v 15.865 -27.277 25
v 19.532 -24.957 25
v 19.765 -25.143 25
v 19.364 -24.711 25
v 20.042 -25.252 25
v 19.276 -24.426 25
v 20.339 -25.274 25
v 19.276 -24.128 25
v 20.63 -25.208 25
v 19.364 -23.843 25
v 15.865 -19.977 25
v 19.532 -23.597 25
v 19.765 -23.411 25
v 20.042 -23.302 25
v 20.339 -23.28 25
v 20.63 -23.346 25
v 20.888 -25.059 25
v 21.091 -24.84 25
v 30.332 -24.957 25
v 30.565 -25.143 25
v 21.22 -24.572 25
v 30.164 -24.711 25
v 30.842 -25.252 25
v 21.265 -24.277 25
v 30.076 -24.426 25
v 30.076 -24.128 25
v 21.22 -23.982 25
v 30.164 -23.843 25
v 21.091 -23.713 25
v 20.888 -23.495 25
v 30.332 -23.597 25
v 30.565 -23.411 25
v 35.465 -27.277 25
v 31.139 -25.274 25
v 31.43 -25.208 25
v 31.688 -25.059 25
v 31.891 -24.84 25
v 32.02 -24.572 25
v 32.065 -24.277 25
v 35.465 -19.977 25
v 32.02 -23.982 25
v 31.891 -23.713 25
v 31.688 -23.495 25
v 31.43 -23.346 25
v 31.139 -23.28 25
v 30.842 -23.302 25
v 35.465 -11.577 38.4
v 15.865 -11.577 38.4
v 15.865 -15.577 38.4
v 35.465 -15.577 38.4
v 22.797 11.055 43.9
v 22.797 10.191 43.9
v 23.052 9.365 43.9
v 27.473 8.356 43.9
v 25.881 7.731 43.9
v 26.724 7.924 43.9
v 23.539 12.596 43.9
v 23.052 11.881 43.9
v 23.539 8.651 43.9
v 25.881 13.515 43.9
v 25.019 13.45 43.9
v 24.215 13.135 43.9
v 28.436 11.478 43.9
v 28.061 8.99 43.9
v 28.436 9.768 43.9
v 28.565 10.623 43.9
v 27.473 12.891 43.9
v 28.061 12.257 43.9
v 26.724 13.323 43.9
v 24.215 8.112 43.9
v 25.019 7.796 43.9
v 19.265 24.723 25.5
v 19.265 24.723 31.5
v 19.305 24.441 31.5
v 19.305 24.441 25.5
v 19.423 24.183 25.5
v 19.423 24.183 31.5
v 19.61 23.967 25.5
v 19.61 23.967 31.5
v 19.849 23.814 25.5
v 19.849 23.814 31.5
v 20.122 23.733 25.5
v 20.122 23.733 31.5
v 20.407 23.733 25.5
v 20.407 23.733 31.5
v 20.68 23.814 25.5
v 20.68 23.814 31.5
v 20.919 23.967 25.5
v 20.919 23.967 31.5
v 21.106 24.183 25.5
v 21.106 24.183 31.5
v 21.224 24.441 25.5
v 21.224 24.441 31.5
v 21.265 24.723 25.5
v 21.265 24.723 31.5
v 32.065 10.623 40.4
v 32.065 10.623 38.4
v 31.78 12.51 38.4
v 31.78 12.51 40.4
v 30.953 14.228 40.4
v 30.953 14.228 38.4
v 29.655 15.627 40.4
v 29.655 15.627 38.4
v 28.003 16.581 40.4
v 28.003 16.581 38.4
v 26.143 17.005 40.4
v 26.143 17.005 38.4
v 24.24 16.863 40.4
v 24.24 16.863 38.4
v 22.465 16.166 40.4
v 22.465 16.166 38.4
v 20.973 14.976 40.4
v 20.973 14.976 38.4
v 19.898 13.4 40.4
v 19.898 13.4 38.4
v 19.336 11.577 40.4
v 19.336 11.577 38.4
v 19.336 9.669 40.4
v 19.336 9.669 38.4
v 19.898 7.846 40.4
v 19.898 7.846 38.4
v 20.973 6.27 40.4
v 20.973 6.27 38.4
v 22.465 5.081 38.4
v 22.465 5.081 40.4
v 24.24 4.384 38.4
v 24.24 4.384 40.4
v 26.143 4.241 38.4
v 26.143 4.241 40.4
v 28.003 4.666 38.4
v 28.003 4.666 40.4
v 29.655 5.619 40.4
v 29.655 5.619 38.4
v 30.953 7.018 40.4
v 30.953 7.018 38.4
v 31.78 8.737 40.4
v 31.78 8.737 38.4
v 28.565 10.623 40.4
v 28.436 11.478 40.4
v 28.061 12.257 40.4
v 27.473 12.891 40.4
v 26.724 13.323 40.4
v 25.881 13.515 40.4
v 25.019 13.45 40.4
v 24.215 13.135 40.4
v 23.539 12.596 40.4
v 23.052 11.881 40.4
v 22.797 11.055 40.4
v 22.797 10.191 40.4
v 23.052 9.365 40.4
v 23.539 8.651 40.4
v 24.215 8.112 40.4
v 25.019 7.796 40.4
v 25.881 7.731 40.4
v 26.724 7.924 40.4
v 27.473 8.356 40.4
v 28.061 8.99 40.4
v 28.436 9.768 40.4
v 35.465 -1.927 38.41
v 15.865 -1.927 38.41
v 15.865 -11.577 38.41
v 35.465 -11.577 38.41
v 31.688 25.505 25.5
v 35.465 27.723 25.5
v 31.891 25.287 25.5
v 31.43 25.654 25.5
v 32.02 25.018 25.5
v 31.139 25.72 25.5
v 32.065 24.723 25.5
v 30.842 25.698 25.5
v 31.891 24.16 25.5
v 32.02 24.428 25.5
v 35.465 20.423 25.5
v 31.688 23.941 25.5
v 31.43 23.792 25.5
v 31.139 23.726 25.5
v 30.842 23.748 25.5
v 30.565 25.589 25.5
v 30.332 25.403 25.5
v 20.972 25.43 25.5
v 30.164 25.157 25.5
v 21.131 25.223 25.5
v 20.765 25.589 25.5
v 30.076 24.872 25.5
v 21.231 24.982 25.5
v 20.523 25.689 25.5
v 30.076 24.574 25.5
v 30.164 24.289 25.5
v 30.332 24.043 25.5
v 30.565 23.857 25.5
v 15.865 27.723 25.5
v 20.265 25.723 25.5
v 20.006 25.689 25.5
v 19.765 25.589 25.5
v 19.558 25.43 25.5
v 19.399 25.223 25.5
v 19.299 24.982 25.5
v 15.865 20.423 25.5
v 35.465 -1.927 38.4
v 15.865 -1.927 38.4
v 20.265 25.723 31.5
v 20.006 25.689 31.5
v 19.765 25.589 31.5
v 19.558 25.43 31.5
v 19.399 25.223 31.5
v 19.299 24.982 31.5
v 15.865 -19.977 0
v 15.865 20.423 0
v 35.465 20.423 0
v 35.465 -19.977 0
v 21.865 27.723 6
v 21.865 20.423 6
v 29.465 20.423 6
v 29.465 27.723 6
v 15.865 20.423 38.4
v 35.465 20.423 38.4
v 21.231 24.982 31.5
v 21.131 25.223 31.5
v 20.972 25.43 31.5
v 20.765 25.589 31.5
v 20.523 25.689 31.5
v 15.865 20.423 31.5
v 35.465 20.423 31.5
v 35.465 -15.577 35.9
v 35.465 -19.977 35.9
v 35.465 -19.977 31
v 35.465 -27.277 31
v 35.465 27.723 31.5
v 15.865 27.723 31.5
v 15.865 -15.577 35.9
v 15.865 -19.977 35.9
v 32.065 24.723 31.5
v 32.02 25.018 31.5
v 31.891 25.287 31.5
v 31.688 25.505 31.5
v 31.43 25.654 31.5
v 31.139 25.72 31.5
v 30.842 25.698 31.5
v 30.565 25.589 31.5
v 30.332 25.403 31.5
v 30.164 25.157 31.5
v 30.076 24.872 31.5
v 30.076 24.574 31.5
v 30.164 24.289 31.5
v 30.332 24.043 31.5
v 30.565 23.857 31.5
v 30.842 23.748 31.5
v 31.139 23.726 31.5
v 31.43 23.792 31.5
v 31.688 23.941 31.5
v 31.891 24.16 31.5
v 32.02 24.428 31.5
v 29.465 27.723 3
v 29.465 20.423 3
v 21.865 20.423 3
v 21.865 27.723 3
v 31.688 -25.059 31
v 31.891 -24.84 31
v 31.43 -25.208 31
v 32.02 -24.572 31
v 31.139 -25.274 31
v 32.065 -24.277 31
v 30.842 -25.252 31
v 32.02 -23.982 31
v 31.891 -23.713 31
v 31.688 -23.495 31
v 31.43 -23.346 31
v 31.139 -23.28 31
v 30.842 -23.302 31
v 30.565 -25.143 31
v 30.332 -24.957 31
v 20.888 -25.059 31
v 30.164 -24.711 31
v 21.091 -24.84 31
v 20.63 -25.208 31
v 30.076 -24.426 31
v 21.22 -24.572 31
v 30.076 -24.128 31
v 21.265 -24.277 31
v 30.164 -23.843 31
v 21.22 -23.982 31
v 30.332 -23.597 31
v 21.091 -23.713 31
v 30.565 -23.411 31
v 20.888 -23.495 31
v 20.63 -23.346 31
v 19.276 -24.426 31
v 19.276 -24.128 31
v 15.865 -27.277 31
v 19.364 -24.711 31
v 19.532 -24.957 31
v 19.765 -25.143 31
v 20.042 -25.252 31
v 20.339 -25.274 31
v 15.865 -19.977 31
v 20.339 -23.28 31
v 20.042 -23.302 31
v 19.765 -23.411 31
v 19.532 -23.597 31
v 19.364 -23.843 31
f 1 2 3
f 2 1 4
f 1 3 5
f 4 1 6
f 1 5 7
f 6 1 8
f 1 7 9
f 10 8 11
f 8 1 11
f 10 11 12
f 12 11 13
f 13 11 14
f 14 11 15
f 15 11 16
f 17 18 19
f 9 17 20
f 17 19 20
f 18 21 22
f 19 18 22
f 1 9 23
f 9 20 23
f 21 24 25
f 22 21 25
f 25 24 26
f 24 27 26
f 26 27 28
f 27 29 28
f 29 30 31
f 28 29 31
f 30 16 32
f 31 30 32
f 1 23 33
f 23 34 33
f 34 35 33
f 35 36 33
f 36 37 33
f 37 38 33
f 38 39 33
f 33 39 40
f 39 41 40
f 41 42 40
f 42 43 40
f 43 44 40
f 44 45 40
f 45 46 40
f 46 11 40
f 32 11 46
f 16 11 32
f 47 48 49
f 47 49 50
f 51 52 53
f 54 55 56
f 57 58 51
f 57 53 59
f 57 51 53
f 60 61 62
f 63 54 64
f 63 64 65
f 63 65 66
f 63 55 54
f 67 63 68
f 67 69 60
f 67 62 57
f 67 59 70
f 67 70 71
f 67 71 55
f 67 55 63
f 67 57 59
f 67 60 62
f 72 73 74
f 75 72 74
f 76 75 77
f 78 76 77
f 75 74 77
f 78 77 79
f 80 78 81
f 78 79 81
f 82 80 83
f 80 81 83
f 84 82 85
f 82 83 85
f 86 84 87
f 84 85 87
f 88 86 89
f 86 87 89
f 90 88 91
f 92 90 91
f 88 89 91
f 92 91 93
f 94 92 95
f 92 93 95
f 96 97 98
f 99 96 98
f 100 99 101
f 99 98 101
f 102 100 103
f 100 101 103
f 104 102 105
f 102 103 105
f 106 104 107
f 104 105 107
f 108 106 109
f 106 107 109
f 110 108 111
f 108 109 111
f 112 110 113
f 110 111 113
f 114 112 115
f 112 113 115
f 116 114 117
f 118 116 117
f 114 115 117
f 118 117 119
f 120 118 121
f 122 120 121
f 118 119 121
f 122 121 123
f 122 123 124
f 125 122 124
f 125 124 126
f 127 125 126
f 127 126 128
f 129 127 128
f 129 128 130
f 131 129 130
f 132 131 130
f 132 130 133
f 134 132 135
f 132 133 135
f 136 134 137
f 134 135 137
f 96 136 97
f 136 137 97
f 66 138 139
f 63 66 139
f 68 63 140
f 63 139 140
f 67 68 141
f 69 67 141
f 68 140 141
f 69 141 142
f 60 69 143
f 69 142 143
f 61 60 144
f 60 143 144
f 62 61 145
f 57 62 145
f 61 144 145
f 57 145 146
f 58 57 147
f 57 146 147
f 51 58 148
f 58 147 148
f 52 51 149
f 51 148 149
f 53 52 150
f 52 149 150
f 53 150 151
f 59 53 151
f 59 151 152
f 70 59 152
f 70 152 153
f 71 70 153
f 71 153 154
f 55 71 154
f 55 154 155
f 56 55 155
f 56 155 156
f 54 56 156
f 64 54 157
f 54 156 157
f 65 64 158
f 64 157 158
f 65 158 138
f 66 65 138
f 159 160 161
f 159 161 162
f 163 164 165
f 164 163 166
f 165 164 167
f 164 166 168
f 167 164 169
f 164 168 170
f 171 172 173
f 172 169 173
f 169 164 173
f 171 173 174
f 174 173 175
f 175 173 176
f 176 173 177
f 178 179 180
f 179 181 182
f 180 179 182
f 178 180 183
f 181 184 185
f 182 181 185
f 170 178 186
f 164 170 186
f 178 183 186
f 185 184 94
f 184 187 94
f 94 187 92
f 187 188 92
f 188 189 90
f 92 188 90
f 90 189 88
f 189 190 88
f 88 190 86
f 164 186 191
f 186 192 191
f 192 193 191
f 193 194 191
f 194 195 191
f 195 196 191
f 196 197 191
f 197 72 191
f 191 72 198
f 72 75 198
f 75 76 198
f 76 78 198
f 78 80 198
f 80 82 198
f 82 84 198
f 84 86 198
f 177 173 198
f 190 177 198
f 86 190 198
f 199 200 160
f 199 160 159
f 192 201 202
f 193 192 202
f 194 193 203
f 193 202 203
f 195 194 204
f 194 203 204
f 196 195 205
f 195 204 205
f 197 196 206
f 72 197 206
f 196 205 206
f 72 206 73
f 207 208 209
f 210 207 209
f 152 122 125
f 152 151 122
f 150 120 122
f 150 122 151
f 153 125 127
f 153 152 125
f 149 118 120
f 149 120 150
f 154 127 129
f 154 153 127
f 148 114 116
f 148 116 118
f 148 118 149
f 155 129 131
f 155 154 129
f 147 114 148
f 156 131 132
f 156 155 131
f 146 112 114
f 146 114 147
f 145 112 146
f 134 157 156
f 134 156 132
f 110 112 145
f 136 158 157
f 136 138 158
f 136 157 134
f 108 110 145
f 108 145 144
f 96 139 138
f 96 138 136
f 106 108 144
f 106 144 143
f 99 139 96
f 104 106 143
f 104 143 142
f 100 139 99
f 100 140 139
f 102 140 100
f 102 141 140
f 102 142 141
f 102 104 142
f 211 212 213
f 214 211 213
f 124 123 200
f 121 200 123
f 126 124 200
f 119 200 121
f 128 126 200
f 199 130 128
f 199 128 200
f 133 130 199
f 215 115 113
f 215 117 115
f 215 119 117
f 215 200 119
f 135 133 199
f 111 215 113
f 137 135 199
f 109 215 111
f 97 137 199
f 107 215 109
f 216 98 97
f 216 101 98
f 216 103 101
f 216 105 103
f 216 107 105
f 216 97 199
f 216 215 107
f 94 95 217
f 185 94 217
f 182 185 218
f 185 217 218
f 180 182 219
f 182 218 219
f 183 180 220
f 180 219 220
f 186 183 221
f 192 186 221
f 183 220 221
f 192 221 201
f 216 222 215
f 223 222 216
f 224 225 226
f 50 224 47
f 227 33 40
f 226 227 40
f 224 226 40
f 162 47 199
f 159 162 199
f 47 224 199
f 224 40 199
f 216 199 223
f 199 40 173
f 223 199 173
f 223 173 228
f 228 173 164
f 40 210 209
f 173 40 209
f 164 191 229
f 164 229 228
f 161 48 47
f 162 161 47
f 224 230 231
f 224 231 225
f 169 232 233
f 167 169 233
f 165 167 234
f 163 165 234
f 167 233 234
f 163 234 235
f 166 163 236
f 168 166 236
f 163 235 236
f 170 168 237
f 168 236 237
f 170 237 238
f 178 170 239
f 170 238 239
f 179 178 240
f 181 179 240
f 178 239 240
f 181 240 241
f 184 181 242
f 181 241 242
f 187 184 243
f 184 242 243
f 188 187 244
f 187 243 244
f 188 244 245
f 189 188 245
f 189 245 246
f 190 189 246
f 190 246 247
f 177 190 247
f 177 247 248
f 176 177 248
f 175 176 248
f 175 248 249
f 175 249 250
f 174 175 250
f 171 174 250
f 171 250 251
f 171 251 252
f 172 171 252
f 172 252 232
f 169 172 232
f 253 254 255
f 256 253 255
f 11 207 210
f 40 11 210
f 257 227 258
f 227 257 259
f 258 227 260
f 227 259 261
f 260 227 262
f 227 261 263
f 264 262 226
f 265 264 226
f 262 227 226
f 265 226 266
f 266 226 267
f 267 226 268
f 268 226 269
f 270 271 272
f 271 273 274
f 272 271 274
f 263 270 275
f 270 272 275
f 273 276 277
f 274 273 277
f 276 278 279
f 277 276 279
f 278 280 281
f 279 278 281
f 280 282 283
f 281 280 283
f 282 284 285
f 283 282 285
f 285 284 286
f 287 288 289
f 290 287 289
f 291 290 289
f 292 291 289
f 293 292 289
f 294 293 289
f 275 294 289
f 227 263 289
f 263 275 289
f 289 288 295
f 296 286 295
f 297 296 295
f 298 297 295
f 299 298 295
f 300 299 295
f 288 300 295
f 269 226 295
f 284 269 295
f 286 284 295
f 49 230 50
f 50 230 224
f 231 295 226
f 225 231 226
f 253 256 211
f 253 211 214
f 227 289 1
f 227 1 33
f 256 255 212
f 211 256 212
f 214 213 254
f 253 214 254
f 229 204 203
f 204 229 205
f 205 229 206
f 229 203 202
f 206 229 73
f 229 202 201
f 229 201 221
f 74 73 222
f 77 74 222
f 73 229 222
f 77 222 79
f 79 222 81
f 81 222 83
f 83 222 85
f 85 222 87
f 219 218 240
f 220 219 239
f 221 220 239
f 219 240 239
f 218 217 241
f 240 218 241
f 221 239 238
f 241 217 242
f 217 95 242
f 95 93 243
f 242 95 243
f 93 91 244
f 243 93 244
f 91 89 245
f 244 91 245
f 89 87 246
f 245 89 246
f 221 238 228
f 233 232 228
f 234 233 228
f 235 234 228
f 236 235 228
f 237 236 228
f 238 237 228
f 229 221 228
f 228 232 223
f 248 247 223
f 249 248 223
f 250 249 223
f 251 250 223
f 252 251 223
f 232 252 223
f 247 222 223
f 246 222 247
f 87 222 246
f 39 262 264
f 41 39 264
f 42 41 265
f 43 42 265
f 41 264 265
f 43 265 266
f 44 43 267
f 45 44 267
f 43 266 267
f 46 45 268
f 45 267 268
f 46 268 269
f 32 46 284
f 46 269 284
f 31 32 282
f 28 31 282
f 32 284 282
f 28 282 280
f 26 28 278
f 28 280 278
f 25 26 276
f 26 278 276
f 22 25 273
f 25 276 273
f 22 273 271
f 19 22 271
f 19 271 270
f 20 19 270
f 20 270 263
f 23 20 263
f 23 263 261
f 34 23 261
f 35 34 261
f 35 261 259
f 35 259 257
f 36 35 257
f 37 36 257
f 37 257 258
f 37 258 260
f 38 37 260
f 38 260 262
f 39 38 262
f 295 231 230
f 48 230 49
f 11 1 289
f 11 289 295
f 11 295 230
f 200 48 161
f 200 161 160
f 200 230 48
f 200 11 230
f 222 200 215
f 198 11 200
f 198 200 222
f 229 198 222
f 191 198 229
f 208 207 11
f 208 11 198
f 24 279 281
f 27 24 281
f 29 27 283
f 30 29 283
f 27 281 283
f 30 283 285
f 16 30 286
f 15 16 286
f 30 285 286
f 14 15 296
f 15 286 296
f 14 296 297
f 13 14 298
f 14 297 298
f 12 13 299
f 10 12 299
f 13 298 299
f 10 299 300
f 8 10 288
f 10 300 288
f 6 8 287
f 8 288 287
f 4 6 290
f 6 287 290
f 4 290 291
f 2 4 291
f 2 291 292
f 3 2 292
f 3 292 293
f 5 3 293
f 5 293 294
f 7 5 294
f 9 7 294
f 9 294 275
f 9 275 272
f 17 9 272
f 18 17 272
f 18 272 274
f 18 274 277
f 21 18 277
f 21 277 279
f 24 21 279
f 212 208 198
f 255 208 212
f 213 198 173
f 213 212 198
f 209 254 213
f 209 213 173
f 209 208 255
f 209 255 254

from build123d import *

# Parameters (mm, degrees)
SKETCH_2_W          = 19.6
SKETCH_2_H          = 40.4
EXTRUDE_2_DEPTH     = 35.9
SKETCH_8_W          = 19.6
SKETCH_8_H          = 36
EXTRUDE_4_DEPTH     = 2.5
EXTRUDE_5_DEPTH     = 7.3
EXTRUDE_6_DEPTH     = 7.3
EXTRUDE_7_DEPTH     = 7.3
SKETCH_13_R         = 6.4
EXTRUDE_8_DEPTH     = 2
SKETCH_15_R         = 2.9
EXTRUDE_9_DEPTH     = 3.5
SKETCH_16_W         = 19.6
SKETCH_16_H         = 9.65
EXTRUDE_10_DEPTH    = 0.01
SKETCH_17_R         = 1
CUT_EXTRUDE_1_DEPTH = 10
CUT_EXTRUDE_2_DEPTH = 10
SKETCH_19_R         = 1
CUT_EXTRUDE_3_DEPTH = 10


with BuildPart() as part:
    # ｽｹｯﾁ2 → ﾎﾞｽ - 押し出し2 (new body)
    with BuildSketch(Plane.XY):
        with Locations((25.664618486, 0.22320442)):
            Rectangle(SKETCH_2_W, SKETCH_2_H)
    extrude(amount=EXTRUDE_2_DEPTH)

    # ｽｹｯﾁ8 → ﾎﾞｽ - 押し出し4 (add)
    with BuildSketch(Plane.XY.offset(35.9)):
        with Locations((25.664618486, 2.42320442)):
            Rectangle(SKETCH_8_W, SKETCH_8_H)
    extrude(amount=EXTRUDE_4_DEPTH)

    # ｽｹｯﾁ9 → ﾎﾞｽ - 押し出し5 (add)
    with BuildSketch(Plane(origin=(0, 20.42320442, 0), x_dir=(1, 0, 0), z_dir=(0, 1, 0))):
        Polygon((35.464618486, -31.499834605), (35.464618486, -25.499834605), (25.664618486, -25.499834605), (15.864618486, -25.499834605), (15.864618486, -31.499834605), align=None)
    extrude(amount=EXTRUDE_5_DEPTH)

    # ｽｹｯﾁ10 → ﾎﾞｽ - 押し出し6 (add)
    with BuildSketch(Plane.XZ.offset(19.97679558)):
        Polygon((15.864618486, 31), (15.864618486, 25), (25.664618486, 25), (35.464618486, 25), (35.464618486, 31), align=None)
    extrude(amount=EXTRUDE_6_DEPTH)

    # ｽｹｯﾁ11 → ﾎﾞｽ - 押し出し7 (add)
    with BuildSketch(Plane(origin=(0, 20.42320442, 0), x_dir=(1, 0, 0), z_dir=(0, 1, 0))):
        Polygon((29.464618486, -3), (25.664618486, -3), (21.864618486, -3), (21.864618486, -6), (29.464618486, -6), align=None)
    extrude(amount=EXTRUDE_7_DEPTH)

    # ｽｹｯﾁ13 → ﾎﾞｽ - 押し出し8 (add)
    with BuildSketch(Plane.XY.offset(38.4)):
        with Locations((25.664618486, 10.62320442)):
            Circle(SKETCH_13_R)
    extrude(amount=EXTRUDE_8_DEPTH)

    # ｽｹｯﾁ15 → ﾎﾞｽ - 押し出し9 (add)
    with BuildSketch(Plane.XY.offset(40.4)):
        with Locations((25.664618486, 10.62320442)):
            Circle(SKETCH_15_R)
    extrude(amount=EXTRUDE_9_DEPTH)

    # ｽｹｯﾁ16 → ﾎﾞｽ - 押し出し10 (add)
    with BuildSketch(Plane.XY.offset(38.4)):
        with Locations((25.664618486, -6.75179558)):
            Rectangle(SKETCH_16_W, SKETCH_16_H)
    extrude(amount=EXTRUDE_10_DEPTH)

    # ｽｹｯﾁ17 → ｶｯﾄ - 押し出し1 (cut)
    with BuildSketch(Plane.XY.offset(31.499834605)):
        with Locations((31.064618486, 24.72320442)):
            Circle(SKETCH_17_R)
    extrude(amount=-CUT_EXTRUDE_1_DEPTH, mode=Mode.SUBTRACT)

    # ｽｹｯﾁ18 → ｶｯﾄ - 押し出し2 (cut)
    with BuildSketch(Plane.XY.offset(31.499834605)):
        with BuildLine():
            ThreePointArc((21.264618486, 24.72320442), (20.971725267, 25.430311201), (20.264618486, 25.72320442))
            Line((20.264618486, 25.72320442), (20.264618486, 24.72320442))
            Line((20.264618486, 24.72320442), (19.264618486, 24.72320442))
            ThreePointArc((19.264618486, 24.72320442), (20.264618486, 23.72320442), (21.264618486, 24.72320442))
        make_face()
        with BuildLine():
            Line((20.264618486, 24.72320442), (20.264618486, 25.72320442))
            ThreePointArc((20.264618486, 25.72320442), (19.557511705, 25.430311201), (19.264618486, 24.72320442))
            Line((19.264618486, 24.72320442), (20.264618486, 24.72320442))
        make_face()
    extrude(amount=-CUT_EXTRUDE_2_DEPTH, mode=Mode.SUBTRACT)

    # ｽｹｯﾁ19 → ｶｯﾄ - 押し出し3 (cut)
    with BuildSketch(Plane.XY.offset(31)):
        with Locations((20.264618486, -24.27679558)):
            Circle(SKETCH_19_R)
        with Locations((31.064618486, -24.27679558)):
            Circle(SKETCH_19_R)
    extrude(amount=-CUT_EXTRUDE_3_DEPTH, mode=Mode.SUBTRACT)


solid = part.part
